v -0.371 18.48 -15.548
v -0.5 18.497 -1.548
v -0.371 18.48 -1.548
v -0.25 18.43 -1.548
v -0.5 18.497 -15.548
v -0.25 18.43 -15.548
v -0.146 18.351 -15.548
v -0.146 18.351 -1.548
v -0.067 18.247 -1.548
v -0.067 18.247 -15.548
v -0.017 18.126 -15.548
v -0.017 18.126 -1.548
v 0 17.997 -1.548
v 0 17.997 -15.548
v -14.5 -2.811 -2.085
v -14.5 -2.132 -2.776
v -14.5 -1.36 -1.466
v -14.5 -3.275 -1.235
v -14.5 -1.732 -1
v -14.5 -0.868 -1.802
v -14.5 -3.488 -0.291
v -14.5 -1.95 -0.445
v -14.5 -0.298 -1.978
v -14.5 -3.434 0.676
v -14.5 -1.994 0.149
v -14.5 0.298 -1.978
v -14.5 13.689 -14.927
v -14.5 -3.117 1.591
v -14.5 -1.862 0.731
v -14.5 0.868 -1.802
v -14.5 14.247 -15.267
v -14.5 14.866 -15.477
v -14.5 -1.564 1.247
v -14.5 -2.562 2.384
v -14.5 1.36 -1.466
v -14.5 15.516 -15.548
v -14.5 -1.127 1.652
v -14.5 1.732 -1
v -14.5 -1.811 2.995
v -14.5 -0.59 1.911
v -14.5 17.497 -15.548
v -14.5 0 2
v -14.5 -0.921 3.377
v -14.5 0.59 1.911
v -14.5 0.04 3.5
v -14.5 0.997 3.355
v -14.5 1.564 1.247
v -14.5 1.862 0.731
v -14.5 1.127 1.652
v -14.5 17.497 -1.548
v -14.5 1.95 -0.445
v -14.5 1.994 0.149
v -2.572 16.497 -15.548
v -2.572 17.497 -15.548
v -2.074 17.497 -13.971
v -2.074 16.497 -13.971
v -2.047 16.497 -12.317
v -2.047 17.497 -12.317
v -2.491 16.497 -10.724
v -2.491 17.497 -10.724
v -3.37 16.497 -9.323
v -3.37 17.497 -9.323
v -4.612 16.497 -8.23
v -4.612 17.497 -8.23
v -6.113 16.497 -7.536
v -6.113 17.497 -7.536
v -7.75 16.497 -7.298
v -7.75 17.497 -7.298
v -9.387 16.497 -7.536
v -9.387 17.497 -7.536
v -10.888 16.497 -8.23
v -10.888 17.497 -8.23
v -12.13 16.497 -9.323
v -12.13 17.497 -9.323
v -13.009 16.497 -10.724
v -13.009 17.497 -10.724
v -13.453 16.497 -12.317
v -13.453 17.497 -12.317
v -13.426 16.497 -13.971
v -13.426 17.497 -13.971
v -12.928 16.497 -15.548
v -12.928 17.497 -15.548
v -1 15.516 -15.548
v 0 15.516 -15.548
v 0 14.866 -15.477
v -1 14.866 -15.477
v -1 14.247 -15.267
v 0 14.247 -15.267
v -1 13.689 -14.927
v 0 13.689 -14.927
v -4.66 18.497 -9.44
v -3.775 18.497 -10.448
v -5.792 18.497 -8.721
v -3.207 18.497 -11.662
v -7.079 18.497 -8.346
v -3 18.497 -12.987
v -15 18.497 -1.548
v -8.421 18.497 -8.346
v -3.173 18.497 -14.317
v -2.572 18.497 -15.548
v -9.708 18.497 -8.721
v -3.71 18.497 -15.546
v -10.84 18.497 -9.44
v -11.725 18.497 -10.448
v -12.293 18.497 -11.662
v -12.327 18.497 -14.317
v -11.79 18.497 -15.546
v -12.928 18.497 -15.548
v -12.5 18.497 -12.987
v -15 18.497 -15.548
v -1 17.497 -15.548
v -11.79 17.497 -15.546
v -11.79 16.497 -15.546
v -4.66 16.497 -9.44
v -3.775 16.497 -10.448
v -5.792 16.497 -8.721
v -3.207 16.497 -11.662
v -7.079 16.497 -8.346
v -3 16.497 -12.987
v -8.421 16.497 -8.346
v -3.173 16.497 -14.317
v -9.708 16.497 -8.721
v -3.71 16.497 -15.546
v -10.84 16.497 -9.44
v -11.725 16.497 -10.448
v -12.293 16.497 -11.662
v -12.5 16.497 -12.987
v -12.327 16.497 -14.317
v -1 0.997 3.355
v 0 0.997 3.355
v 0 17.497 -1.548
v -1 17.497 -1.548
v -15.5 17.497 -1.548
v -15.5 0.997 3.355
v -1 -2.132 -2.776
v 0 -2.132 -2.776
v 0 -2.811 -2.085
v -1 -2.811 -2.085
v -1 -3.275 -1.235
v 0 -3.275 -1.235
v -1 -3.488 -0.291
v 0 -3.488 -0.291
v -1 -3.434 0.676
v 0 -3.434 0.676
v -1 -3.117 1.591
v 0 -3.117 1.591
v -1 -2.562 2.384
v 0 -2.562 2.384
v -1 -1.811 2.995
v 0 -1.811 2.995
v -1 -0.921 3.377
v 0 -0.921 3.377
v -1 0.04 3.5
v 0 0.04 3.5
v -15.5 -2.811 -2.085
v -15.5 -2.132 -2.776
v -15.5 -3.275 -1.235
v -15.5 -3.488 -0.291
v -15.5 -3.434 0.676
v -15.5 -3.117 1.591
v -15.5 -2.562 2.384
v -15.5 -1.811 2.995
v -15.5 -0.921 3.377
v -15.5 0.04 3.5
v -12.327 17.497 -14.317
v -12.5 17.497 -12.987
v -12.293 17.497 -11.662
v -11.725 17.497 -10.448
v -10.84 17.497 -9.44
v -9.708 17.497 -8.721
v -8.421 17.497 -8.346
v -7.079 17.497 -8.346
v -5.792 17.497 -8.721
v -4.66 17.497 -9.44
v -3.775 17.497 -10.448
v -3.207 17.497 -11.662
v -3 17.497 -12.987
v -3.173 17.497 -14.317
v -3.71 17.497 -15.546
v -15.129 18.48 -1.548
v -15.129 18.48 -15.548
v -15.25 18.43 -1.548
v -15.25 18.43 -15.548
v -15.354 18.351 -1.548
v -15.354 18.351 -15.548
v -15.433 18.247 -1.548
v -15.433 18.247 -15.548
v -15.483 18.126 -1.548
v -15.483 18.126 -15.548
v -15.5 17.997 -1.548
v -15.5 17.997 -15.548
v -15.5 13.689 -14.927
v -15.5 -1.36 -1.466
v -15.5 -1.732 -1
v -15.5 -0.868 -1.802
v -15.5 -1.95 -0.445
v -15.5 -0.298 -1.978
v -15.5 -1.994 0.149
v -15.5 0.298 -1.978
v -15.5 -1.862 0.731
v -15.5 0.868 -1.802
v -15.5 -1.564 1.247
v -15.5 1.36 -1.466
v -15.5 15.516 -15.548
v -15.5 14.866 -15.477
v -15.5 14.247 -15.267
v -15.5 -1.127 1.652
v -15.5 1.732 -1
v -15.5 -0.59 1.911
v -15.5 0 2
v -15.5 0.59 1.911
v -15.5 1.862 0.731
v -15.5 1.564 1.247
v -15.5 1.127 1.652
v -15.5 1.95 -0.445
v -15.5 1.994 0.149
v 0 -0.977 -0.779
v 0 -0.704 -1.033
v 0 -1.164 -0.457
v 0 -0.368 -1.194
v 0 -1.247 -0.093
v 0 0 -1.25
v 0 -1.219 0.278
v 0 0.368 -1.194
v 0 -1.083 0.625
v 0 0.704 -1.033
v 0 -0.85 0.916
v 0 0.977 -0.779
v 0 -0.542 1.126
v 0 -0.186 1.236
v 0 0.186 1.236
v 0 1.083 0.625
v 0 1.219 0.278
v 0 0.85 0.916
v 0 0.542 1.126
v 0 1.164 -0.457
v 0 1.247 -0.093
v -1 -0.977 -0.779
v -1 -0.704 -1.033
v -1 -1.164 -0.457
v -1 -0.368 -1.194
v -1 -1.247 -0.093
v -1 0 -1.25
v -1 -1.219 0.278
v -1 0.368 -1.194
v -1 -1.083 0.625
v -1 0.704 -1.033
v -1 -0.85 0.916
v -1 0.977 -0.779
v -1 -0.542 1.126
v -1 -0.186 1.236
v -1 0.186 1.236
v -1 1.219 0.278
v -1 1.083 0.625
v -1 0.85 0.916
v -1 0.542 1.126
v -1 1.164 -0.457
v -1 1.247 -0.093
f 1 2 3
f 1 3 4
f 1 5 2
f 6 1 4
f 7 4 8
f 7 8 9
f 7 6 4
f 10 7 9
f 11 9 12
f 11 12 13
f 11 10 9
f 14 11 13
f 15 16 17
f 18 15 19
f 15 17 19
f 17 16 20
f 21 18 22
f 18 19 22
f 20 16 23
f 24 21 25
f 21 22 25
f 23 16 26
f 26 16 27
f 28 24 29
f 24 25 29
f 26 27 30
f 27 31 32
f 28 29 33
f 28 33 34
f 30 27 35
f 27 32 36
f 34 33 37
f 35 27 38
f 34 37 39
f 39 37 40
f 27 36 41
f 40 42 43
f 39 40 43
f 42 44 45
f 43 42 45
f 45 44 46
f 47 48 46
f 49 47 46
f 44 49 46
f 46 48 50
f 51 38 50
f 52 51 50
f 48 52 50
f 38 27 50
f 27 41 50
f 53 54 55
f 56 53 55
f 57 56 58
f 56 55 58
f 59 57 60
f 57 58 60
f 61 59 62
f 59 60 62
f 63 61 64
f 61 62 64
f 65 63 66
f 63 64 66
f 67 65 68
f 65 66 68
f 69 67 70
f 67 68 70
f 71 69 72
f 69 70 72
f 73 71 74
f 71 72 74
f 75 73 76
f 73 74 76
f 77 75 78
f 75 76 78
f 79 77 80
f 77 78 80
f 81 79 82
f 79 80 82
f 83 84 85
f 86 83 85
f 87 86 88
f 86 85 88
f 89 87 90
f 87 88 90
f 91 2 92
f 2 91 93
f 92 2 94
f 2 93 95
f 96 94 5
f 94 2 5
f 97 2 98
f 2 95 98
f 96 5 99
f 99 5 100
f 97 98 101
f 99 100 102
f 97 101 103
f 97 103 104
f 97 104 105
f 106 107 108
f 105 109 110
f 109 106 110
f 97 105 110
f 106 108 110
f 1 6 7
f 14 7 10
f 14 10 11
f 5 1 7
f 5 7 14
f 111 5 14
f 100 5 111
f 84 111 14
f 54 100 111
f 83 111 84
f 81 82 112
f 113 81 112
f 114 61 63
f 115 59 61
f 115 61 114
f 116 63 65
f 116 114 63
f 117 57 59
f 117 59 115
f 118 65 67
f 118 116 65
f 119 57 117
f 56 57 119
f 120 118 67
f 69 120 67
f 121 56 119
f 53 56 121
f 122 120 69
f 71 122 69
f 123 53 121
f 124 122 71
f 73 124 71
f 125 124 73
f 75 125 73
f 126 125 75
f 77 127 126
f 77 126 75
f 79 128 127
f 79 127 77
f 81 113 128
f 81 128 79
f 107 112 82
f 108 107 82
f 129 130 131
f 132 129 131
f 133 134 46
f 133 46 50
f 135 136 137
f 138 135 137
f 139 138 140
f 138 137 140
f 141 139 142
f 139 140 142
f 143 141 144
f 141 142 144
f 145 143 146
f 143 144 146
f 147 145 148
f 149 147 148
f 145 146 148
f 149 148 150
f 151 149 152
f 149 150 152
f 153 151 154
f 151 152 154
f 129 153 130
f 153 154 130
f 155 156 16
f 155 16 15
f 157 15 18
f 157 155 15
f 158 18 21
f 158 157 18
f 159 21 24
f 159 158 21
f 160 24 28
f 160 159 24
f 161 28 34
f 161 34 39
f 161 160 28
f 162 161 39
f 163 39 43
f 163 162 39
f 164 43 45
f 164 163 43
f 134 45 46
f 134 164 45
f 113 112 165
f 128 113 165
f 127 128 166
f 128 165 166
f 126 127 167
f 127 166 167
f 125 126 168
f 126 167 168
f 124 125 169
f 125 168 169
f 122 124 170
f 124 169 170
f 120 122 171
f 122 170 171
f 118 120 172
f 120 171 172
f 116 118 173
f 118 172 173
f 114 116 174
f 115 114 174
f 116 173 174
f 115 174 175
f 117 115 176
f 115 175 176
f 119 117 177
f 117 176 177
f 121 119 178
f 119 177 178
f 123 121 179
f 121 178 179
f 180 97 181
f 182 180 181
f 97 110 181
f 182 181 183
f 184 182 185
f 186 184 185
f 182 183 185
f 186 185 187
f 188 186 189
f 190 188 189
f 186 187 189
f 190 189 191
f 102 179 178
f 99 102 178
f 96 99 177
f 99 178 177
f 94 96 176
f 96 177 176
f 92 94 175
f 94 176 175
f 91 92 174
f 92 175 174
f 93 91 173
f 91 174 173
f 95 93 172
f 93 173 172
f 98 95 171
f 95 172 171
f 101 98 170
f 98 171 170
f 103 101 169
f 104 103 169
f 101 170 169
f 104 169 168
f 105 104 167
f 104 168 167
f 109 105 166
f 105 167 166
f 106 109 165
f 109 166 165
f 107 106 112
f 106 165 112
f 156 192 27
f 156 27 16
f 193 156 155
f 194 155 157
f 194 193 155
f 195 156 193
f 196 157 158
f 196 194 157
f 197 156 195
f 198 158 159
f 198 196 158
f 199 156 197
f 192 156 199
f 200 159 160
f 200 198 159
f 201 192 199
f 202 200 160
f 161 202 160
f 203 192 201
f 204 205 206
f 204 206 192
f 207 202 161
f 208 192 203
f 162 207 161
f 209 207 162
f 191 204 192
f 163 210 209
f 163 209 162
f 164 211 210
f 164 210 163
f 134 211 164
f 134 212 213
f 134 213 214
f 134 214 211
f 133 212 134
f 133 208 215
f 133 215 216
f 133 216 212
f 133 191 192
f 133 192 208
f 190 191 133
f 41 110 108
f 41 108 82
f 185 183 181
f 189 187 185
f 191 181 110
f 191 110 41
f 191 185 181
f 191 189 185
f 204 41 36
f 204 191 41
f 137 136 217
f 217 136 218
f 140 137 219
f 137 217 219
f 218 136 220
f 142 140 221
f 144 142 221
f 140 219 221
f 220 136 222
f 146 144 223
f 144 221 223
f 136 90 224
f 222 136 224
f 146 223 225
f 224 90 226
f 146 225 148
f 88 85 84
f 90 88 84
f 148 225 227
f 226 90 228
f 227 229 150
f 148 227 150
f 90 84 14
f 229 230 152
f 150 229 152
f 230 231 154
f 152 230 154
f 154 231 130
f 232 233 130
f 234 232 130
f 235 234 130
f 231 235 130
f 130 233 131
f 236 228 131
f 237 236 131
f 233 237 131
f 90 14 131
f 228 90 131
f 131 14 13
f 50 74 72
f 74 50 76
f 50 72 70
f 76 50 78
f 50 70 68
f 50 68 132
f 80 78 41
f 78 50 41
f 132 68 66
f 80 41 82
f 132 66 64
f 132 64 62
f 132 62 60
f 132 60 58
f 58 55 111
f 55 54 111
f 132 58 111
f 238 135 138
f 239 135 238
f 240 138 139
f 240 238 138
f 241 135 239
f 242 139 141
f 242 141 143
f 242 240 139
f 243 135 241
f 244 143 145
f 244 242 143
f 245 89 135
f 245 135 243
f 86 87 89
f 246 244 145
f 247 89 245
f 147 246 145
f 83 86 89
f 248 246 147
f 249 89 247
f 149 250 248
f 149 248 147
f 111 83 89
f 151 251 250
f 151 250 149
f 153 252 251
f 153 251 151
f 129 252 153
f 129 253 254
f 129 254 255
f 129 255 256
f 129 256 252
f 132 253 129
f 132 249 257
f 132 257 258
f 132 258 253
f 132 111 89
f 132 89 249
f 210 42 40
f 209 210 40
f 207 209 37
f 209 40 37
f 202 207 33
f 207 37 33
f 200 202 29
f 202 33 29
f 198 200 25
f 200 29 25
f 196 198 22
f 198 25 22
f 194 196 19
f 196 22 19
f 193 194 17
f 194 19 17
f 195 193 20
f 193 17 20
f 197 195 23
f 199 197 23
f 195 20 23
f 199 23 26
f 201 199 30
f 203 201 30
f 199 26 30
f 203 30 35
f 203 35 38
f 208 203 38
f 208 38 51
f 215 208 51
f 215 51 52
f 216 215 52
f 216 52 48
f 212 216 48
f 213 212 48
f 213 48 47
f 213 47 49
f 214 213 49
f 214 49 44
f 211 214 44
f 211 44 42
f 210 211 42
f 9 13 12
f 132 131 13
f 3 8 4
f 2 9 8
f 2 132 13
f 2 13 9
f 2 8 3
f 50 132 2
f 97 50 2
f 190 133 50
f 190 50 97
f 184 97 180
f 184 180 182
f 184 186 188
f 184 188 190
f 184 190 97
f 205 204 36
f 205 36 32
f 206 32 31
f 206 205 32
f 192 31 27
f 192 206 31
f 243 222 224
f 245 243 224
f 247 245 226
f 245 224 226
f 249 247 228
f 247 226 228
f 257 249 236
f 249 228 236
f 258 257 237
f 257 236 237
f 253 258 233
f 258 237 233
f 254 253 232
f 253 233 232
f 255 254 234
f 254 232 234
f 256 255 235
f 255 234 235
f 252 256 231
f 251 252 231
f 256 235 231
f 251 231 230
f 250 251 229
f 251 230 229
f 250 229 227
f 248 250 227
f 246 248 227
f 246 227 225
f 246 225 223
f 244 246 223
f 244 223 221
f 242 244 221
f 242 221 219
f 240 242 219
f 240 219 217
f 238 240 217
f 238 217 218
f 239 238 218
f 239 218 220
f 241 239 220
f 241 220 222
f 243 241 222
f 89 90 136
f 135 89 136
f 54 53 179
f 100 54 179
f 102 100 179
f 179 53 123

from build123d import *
from build123d.topology import SkipClean

# Parameters (mm, degrees)
BOSS_EXTRUDE1_DEPTH = 2
SKETCH2_W           = 31
SKETCH2_H           = 28
BOSS_EXTRUDE2_DEPTH = 2
BOSS_EXTRUDE3_DEPTH = 4
CUT_EXTRUDE1_DEPTH  = 4
FILLET1_R           = 1
CUT_EXTRUDE2_START  = -29
SKETCH5_R           = 4
CUT_EXTRUDE2_DEPTH  = 10
SKETCH6_R           = 2.5
CUT_EXTRUDE3_DEPTH  = 10
SCALE1_SCALE        = 0.5


with BuildPart() as part:
    # Sketch1 → Boss-Extrude1 (new body)
    with BuildSketch(Plane(origin=(0, 0, 0), x_dir=(0, 0, -1), z_dir=(1, 0, 0))):
        with BuildLine():
            Line((-6.709990017, 1.993999493), (3.096579457, 34.993999493))
            Line((3.096579457, 34.993999493), (3.096579457, 36.993999493))
            Line((3.096579457, 36.993999493), (31.096579457, 36.993999493))
            Line((31.096579457, 36.993999493), (31.096579457, 31.032332545))
            ThreePointArc((31.096579457, 31.032332545), (30.777696783, 29.102331009), (29.854944147, 27.377477489))
            Line((29.854944147, 27.377477489), (5.551425471, -4.263997566))
            ThreePointArc((5.551425471, -4.263997566), (-3.182169032, -6.234885745), (-6.709990017, 1.993999493))
        make_face()
    extrude(amount=-BOSS_EXTRUDE1_DEPTH)


with BuildPart() as body_2:
    # Mirror1: mirrored copy
    add(part.part.mirror(Plane(origin=(-15.5, 0, 0), x_dir=(0, 0, 1), z_dir=(1, 0, 0))))


with BuildPart() as part_1:
    add(part.part)

    add(body_2.part)  # Boss-Extrude2 merges body 2
    # Sketch2 → Boss-Extrude2 (add)
    with BuildSketch(Plane(origin=(0, 36.993999493, 0), x_dir=(1, 0, 0), z_dir=(0, 1, 0))):
        with Locations((-15.5, 17.096579457)):
            Rectangle(SKETCH2_W, SKETCH2_H)
    extrude(amount=-BOSS_EXTRUDE2_DEPTH)

    # Sketch3 → Boss-Extrude3 (add)
    with BuildSketch(Plane(origin=(0, 36.993999493, 0), x_dir=(1, 0, 0), z_dir=(0, 1, 0))):
        with BuildLine():
            Line((-7.41958555, 31.09226783), (-5.143842411, 31.096579457))
            ThreePointArc((-5.143842411, 31.096579457), (-15.5, 14.596579457), (-25.856157589, 31.096579457))
            Line((-25.856157589, 31.096579457), (-23.58041445, 31.09226783))
            ThreePointArc((-23.58041445, 31.09226783), (-15.5, 16.596579457), (-7.41958555, 31.09226783))
        make_face()
    extrude(amount=-BOSS_EXTRUDE3_DEPTH)

    # Sketch4 → Cut-Extrude1 (cut)
    with SkipClean():  # the faces are left unmerged after this step: merging them gives an invalid solid
        with BuildSketch(Plane.XZ.offset(-34.993999493)):
            with BuildLine():
                Line((-5.143842411, -31.096579457), (-7.41958555, -31.09226783))
                ThreePointArc((-7.41958555, -31.09226783), (-15.5, -16.596579457), (-23.58041445, -31.09226783))
                Line((-23.58041445, -31.09226783), (-25.856157589, -31.096579457))
                Line((-25.856157589, -31.096579457), (-5.143842411, -31.096579457))
            make_face()
        extrude(amount=-CUT_EXTRUDE1_DEPTH, mode=Mode.SUBTRACT)

    # Fillet1
    fillet1_edges = [part_1.edges().sort_by_distance(p)[0] for p in [
        (-31, 36.993999493, -17.096579457),
        (0, 36.993999493, -17.096579457),
    ]]
    fillet(fillet1_edges, radius=FILLET1_R)

    # Sketch5 → Cut-Extrude2 (cut)
    with SkipClean():  # the faces are left unmerged after this step: merging them gives an invalid solid
        with BuildSketch(Plane(origin=(0, 0, 0), x_dir=(0, 0, -1), z_dir=(1, 0, 0)).offset(CUT_EXTRUDE2_START)):
            with Locations(Location((0, 0, 0), (0, 0, 180))):
                Circle(SKETCH5_R)
        extrude(amount=-CUT_EXTRUDE2_DEPTH, mode=Mode.SUBTRACT)

    # Sketch6 → Cut-Extrude3 (cut)
    with SkipClean():  # the faces are left unmerged after this step: merging them gives an invalid solid
        with BuildSketch(Plane(origin=(0, 0, 0), x_dir=(0, 0, -1), z_dir=(1, 0, 0))):
            Circle(SKETCH6_R)
        extrude(amount=-CUT_EXTRUDE3_DEPTH, mode=Mode.SUBTRACT)


with BuildPart() as part_2:
    # Scale1: scaled about (0, 0, 0)
    add(part_1.part.scale(SCALE1_SCALE))


solid = part_2.part
